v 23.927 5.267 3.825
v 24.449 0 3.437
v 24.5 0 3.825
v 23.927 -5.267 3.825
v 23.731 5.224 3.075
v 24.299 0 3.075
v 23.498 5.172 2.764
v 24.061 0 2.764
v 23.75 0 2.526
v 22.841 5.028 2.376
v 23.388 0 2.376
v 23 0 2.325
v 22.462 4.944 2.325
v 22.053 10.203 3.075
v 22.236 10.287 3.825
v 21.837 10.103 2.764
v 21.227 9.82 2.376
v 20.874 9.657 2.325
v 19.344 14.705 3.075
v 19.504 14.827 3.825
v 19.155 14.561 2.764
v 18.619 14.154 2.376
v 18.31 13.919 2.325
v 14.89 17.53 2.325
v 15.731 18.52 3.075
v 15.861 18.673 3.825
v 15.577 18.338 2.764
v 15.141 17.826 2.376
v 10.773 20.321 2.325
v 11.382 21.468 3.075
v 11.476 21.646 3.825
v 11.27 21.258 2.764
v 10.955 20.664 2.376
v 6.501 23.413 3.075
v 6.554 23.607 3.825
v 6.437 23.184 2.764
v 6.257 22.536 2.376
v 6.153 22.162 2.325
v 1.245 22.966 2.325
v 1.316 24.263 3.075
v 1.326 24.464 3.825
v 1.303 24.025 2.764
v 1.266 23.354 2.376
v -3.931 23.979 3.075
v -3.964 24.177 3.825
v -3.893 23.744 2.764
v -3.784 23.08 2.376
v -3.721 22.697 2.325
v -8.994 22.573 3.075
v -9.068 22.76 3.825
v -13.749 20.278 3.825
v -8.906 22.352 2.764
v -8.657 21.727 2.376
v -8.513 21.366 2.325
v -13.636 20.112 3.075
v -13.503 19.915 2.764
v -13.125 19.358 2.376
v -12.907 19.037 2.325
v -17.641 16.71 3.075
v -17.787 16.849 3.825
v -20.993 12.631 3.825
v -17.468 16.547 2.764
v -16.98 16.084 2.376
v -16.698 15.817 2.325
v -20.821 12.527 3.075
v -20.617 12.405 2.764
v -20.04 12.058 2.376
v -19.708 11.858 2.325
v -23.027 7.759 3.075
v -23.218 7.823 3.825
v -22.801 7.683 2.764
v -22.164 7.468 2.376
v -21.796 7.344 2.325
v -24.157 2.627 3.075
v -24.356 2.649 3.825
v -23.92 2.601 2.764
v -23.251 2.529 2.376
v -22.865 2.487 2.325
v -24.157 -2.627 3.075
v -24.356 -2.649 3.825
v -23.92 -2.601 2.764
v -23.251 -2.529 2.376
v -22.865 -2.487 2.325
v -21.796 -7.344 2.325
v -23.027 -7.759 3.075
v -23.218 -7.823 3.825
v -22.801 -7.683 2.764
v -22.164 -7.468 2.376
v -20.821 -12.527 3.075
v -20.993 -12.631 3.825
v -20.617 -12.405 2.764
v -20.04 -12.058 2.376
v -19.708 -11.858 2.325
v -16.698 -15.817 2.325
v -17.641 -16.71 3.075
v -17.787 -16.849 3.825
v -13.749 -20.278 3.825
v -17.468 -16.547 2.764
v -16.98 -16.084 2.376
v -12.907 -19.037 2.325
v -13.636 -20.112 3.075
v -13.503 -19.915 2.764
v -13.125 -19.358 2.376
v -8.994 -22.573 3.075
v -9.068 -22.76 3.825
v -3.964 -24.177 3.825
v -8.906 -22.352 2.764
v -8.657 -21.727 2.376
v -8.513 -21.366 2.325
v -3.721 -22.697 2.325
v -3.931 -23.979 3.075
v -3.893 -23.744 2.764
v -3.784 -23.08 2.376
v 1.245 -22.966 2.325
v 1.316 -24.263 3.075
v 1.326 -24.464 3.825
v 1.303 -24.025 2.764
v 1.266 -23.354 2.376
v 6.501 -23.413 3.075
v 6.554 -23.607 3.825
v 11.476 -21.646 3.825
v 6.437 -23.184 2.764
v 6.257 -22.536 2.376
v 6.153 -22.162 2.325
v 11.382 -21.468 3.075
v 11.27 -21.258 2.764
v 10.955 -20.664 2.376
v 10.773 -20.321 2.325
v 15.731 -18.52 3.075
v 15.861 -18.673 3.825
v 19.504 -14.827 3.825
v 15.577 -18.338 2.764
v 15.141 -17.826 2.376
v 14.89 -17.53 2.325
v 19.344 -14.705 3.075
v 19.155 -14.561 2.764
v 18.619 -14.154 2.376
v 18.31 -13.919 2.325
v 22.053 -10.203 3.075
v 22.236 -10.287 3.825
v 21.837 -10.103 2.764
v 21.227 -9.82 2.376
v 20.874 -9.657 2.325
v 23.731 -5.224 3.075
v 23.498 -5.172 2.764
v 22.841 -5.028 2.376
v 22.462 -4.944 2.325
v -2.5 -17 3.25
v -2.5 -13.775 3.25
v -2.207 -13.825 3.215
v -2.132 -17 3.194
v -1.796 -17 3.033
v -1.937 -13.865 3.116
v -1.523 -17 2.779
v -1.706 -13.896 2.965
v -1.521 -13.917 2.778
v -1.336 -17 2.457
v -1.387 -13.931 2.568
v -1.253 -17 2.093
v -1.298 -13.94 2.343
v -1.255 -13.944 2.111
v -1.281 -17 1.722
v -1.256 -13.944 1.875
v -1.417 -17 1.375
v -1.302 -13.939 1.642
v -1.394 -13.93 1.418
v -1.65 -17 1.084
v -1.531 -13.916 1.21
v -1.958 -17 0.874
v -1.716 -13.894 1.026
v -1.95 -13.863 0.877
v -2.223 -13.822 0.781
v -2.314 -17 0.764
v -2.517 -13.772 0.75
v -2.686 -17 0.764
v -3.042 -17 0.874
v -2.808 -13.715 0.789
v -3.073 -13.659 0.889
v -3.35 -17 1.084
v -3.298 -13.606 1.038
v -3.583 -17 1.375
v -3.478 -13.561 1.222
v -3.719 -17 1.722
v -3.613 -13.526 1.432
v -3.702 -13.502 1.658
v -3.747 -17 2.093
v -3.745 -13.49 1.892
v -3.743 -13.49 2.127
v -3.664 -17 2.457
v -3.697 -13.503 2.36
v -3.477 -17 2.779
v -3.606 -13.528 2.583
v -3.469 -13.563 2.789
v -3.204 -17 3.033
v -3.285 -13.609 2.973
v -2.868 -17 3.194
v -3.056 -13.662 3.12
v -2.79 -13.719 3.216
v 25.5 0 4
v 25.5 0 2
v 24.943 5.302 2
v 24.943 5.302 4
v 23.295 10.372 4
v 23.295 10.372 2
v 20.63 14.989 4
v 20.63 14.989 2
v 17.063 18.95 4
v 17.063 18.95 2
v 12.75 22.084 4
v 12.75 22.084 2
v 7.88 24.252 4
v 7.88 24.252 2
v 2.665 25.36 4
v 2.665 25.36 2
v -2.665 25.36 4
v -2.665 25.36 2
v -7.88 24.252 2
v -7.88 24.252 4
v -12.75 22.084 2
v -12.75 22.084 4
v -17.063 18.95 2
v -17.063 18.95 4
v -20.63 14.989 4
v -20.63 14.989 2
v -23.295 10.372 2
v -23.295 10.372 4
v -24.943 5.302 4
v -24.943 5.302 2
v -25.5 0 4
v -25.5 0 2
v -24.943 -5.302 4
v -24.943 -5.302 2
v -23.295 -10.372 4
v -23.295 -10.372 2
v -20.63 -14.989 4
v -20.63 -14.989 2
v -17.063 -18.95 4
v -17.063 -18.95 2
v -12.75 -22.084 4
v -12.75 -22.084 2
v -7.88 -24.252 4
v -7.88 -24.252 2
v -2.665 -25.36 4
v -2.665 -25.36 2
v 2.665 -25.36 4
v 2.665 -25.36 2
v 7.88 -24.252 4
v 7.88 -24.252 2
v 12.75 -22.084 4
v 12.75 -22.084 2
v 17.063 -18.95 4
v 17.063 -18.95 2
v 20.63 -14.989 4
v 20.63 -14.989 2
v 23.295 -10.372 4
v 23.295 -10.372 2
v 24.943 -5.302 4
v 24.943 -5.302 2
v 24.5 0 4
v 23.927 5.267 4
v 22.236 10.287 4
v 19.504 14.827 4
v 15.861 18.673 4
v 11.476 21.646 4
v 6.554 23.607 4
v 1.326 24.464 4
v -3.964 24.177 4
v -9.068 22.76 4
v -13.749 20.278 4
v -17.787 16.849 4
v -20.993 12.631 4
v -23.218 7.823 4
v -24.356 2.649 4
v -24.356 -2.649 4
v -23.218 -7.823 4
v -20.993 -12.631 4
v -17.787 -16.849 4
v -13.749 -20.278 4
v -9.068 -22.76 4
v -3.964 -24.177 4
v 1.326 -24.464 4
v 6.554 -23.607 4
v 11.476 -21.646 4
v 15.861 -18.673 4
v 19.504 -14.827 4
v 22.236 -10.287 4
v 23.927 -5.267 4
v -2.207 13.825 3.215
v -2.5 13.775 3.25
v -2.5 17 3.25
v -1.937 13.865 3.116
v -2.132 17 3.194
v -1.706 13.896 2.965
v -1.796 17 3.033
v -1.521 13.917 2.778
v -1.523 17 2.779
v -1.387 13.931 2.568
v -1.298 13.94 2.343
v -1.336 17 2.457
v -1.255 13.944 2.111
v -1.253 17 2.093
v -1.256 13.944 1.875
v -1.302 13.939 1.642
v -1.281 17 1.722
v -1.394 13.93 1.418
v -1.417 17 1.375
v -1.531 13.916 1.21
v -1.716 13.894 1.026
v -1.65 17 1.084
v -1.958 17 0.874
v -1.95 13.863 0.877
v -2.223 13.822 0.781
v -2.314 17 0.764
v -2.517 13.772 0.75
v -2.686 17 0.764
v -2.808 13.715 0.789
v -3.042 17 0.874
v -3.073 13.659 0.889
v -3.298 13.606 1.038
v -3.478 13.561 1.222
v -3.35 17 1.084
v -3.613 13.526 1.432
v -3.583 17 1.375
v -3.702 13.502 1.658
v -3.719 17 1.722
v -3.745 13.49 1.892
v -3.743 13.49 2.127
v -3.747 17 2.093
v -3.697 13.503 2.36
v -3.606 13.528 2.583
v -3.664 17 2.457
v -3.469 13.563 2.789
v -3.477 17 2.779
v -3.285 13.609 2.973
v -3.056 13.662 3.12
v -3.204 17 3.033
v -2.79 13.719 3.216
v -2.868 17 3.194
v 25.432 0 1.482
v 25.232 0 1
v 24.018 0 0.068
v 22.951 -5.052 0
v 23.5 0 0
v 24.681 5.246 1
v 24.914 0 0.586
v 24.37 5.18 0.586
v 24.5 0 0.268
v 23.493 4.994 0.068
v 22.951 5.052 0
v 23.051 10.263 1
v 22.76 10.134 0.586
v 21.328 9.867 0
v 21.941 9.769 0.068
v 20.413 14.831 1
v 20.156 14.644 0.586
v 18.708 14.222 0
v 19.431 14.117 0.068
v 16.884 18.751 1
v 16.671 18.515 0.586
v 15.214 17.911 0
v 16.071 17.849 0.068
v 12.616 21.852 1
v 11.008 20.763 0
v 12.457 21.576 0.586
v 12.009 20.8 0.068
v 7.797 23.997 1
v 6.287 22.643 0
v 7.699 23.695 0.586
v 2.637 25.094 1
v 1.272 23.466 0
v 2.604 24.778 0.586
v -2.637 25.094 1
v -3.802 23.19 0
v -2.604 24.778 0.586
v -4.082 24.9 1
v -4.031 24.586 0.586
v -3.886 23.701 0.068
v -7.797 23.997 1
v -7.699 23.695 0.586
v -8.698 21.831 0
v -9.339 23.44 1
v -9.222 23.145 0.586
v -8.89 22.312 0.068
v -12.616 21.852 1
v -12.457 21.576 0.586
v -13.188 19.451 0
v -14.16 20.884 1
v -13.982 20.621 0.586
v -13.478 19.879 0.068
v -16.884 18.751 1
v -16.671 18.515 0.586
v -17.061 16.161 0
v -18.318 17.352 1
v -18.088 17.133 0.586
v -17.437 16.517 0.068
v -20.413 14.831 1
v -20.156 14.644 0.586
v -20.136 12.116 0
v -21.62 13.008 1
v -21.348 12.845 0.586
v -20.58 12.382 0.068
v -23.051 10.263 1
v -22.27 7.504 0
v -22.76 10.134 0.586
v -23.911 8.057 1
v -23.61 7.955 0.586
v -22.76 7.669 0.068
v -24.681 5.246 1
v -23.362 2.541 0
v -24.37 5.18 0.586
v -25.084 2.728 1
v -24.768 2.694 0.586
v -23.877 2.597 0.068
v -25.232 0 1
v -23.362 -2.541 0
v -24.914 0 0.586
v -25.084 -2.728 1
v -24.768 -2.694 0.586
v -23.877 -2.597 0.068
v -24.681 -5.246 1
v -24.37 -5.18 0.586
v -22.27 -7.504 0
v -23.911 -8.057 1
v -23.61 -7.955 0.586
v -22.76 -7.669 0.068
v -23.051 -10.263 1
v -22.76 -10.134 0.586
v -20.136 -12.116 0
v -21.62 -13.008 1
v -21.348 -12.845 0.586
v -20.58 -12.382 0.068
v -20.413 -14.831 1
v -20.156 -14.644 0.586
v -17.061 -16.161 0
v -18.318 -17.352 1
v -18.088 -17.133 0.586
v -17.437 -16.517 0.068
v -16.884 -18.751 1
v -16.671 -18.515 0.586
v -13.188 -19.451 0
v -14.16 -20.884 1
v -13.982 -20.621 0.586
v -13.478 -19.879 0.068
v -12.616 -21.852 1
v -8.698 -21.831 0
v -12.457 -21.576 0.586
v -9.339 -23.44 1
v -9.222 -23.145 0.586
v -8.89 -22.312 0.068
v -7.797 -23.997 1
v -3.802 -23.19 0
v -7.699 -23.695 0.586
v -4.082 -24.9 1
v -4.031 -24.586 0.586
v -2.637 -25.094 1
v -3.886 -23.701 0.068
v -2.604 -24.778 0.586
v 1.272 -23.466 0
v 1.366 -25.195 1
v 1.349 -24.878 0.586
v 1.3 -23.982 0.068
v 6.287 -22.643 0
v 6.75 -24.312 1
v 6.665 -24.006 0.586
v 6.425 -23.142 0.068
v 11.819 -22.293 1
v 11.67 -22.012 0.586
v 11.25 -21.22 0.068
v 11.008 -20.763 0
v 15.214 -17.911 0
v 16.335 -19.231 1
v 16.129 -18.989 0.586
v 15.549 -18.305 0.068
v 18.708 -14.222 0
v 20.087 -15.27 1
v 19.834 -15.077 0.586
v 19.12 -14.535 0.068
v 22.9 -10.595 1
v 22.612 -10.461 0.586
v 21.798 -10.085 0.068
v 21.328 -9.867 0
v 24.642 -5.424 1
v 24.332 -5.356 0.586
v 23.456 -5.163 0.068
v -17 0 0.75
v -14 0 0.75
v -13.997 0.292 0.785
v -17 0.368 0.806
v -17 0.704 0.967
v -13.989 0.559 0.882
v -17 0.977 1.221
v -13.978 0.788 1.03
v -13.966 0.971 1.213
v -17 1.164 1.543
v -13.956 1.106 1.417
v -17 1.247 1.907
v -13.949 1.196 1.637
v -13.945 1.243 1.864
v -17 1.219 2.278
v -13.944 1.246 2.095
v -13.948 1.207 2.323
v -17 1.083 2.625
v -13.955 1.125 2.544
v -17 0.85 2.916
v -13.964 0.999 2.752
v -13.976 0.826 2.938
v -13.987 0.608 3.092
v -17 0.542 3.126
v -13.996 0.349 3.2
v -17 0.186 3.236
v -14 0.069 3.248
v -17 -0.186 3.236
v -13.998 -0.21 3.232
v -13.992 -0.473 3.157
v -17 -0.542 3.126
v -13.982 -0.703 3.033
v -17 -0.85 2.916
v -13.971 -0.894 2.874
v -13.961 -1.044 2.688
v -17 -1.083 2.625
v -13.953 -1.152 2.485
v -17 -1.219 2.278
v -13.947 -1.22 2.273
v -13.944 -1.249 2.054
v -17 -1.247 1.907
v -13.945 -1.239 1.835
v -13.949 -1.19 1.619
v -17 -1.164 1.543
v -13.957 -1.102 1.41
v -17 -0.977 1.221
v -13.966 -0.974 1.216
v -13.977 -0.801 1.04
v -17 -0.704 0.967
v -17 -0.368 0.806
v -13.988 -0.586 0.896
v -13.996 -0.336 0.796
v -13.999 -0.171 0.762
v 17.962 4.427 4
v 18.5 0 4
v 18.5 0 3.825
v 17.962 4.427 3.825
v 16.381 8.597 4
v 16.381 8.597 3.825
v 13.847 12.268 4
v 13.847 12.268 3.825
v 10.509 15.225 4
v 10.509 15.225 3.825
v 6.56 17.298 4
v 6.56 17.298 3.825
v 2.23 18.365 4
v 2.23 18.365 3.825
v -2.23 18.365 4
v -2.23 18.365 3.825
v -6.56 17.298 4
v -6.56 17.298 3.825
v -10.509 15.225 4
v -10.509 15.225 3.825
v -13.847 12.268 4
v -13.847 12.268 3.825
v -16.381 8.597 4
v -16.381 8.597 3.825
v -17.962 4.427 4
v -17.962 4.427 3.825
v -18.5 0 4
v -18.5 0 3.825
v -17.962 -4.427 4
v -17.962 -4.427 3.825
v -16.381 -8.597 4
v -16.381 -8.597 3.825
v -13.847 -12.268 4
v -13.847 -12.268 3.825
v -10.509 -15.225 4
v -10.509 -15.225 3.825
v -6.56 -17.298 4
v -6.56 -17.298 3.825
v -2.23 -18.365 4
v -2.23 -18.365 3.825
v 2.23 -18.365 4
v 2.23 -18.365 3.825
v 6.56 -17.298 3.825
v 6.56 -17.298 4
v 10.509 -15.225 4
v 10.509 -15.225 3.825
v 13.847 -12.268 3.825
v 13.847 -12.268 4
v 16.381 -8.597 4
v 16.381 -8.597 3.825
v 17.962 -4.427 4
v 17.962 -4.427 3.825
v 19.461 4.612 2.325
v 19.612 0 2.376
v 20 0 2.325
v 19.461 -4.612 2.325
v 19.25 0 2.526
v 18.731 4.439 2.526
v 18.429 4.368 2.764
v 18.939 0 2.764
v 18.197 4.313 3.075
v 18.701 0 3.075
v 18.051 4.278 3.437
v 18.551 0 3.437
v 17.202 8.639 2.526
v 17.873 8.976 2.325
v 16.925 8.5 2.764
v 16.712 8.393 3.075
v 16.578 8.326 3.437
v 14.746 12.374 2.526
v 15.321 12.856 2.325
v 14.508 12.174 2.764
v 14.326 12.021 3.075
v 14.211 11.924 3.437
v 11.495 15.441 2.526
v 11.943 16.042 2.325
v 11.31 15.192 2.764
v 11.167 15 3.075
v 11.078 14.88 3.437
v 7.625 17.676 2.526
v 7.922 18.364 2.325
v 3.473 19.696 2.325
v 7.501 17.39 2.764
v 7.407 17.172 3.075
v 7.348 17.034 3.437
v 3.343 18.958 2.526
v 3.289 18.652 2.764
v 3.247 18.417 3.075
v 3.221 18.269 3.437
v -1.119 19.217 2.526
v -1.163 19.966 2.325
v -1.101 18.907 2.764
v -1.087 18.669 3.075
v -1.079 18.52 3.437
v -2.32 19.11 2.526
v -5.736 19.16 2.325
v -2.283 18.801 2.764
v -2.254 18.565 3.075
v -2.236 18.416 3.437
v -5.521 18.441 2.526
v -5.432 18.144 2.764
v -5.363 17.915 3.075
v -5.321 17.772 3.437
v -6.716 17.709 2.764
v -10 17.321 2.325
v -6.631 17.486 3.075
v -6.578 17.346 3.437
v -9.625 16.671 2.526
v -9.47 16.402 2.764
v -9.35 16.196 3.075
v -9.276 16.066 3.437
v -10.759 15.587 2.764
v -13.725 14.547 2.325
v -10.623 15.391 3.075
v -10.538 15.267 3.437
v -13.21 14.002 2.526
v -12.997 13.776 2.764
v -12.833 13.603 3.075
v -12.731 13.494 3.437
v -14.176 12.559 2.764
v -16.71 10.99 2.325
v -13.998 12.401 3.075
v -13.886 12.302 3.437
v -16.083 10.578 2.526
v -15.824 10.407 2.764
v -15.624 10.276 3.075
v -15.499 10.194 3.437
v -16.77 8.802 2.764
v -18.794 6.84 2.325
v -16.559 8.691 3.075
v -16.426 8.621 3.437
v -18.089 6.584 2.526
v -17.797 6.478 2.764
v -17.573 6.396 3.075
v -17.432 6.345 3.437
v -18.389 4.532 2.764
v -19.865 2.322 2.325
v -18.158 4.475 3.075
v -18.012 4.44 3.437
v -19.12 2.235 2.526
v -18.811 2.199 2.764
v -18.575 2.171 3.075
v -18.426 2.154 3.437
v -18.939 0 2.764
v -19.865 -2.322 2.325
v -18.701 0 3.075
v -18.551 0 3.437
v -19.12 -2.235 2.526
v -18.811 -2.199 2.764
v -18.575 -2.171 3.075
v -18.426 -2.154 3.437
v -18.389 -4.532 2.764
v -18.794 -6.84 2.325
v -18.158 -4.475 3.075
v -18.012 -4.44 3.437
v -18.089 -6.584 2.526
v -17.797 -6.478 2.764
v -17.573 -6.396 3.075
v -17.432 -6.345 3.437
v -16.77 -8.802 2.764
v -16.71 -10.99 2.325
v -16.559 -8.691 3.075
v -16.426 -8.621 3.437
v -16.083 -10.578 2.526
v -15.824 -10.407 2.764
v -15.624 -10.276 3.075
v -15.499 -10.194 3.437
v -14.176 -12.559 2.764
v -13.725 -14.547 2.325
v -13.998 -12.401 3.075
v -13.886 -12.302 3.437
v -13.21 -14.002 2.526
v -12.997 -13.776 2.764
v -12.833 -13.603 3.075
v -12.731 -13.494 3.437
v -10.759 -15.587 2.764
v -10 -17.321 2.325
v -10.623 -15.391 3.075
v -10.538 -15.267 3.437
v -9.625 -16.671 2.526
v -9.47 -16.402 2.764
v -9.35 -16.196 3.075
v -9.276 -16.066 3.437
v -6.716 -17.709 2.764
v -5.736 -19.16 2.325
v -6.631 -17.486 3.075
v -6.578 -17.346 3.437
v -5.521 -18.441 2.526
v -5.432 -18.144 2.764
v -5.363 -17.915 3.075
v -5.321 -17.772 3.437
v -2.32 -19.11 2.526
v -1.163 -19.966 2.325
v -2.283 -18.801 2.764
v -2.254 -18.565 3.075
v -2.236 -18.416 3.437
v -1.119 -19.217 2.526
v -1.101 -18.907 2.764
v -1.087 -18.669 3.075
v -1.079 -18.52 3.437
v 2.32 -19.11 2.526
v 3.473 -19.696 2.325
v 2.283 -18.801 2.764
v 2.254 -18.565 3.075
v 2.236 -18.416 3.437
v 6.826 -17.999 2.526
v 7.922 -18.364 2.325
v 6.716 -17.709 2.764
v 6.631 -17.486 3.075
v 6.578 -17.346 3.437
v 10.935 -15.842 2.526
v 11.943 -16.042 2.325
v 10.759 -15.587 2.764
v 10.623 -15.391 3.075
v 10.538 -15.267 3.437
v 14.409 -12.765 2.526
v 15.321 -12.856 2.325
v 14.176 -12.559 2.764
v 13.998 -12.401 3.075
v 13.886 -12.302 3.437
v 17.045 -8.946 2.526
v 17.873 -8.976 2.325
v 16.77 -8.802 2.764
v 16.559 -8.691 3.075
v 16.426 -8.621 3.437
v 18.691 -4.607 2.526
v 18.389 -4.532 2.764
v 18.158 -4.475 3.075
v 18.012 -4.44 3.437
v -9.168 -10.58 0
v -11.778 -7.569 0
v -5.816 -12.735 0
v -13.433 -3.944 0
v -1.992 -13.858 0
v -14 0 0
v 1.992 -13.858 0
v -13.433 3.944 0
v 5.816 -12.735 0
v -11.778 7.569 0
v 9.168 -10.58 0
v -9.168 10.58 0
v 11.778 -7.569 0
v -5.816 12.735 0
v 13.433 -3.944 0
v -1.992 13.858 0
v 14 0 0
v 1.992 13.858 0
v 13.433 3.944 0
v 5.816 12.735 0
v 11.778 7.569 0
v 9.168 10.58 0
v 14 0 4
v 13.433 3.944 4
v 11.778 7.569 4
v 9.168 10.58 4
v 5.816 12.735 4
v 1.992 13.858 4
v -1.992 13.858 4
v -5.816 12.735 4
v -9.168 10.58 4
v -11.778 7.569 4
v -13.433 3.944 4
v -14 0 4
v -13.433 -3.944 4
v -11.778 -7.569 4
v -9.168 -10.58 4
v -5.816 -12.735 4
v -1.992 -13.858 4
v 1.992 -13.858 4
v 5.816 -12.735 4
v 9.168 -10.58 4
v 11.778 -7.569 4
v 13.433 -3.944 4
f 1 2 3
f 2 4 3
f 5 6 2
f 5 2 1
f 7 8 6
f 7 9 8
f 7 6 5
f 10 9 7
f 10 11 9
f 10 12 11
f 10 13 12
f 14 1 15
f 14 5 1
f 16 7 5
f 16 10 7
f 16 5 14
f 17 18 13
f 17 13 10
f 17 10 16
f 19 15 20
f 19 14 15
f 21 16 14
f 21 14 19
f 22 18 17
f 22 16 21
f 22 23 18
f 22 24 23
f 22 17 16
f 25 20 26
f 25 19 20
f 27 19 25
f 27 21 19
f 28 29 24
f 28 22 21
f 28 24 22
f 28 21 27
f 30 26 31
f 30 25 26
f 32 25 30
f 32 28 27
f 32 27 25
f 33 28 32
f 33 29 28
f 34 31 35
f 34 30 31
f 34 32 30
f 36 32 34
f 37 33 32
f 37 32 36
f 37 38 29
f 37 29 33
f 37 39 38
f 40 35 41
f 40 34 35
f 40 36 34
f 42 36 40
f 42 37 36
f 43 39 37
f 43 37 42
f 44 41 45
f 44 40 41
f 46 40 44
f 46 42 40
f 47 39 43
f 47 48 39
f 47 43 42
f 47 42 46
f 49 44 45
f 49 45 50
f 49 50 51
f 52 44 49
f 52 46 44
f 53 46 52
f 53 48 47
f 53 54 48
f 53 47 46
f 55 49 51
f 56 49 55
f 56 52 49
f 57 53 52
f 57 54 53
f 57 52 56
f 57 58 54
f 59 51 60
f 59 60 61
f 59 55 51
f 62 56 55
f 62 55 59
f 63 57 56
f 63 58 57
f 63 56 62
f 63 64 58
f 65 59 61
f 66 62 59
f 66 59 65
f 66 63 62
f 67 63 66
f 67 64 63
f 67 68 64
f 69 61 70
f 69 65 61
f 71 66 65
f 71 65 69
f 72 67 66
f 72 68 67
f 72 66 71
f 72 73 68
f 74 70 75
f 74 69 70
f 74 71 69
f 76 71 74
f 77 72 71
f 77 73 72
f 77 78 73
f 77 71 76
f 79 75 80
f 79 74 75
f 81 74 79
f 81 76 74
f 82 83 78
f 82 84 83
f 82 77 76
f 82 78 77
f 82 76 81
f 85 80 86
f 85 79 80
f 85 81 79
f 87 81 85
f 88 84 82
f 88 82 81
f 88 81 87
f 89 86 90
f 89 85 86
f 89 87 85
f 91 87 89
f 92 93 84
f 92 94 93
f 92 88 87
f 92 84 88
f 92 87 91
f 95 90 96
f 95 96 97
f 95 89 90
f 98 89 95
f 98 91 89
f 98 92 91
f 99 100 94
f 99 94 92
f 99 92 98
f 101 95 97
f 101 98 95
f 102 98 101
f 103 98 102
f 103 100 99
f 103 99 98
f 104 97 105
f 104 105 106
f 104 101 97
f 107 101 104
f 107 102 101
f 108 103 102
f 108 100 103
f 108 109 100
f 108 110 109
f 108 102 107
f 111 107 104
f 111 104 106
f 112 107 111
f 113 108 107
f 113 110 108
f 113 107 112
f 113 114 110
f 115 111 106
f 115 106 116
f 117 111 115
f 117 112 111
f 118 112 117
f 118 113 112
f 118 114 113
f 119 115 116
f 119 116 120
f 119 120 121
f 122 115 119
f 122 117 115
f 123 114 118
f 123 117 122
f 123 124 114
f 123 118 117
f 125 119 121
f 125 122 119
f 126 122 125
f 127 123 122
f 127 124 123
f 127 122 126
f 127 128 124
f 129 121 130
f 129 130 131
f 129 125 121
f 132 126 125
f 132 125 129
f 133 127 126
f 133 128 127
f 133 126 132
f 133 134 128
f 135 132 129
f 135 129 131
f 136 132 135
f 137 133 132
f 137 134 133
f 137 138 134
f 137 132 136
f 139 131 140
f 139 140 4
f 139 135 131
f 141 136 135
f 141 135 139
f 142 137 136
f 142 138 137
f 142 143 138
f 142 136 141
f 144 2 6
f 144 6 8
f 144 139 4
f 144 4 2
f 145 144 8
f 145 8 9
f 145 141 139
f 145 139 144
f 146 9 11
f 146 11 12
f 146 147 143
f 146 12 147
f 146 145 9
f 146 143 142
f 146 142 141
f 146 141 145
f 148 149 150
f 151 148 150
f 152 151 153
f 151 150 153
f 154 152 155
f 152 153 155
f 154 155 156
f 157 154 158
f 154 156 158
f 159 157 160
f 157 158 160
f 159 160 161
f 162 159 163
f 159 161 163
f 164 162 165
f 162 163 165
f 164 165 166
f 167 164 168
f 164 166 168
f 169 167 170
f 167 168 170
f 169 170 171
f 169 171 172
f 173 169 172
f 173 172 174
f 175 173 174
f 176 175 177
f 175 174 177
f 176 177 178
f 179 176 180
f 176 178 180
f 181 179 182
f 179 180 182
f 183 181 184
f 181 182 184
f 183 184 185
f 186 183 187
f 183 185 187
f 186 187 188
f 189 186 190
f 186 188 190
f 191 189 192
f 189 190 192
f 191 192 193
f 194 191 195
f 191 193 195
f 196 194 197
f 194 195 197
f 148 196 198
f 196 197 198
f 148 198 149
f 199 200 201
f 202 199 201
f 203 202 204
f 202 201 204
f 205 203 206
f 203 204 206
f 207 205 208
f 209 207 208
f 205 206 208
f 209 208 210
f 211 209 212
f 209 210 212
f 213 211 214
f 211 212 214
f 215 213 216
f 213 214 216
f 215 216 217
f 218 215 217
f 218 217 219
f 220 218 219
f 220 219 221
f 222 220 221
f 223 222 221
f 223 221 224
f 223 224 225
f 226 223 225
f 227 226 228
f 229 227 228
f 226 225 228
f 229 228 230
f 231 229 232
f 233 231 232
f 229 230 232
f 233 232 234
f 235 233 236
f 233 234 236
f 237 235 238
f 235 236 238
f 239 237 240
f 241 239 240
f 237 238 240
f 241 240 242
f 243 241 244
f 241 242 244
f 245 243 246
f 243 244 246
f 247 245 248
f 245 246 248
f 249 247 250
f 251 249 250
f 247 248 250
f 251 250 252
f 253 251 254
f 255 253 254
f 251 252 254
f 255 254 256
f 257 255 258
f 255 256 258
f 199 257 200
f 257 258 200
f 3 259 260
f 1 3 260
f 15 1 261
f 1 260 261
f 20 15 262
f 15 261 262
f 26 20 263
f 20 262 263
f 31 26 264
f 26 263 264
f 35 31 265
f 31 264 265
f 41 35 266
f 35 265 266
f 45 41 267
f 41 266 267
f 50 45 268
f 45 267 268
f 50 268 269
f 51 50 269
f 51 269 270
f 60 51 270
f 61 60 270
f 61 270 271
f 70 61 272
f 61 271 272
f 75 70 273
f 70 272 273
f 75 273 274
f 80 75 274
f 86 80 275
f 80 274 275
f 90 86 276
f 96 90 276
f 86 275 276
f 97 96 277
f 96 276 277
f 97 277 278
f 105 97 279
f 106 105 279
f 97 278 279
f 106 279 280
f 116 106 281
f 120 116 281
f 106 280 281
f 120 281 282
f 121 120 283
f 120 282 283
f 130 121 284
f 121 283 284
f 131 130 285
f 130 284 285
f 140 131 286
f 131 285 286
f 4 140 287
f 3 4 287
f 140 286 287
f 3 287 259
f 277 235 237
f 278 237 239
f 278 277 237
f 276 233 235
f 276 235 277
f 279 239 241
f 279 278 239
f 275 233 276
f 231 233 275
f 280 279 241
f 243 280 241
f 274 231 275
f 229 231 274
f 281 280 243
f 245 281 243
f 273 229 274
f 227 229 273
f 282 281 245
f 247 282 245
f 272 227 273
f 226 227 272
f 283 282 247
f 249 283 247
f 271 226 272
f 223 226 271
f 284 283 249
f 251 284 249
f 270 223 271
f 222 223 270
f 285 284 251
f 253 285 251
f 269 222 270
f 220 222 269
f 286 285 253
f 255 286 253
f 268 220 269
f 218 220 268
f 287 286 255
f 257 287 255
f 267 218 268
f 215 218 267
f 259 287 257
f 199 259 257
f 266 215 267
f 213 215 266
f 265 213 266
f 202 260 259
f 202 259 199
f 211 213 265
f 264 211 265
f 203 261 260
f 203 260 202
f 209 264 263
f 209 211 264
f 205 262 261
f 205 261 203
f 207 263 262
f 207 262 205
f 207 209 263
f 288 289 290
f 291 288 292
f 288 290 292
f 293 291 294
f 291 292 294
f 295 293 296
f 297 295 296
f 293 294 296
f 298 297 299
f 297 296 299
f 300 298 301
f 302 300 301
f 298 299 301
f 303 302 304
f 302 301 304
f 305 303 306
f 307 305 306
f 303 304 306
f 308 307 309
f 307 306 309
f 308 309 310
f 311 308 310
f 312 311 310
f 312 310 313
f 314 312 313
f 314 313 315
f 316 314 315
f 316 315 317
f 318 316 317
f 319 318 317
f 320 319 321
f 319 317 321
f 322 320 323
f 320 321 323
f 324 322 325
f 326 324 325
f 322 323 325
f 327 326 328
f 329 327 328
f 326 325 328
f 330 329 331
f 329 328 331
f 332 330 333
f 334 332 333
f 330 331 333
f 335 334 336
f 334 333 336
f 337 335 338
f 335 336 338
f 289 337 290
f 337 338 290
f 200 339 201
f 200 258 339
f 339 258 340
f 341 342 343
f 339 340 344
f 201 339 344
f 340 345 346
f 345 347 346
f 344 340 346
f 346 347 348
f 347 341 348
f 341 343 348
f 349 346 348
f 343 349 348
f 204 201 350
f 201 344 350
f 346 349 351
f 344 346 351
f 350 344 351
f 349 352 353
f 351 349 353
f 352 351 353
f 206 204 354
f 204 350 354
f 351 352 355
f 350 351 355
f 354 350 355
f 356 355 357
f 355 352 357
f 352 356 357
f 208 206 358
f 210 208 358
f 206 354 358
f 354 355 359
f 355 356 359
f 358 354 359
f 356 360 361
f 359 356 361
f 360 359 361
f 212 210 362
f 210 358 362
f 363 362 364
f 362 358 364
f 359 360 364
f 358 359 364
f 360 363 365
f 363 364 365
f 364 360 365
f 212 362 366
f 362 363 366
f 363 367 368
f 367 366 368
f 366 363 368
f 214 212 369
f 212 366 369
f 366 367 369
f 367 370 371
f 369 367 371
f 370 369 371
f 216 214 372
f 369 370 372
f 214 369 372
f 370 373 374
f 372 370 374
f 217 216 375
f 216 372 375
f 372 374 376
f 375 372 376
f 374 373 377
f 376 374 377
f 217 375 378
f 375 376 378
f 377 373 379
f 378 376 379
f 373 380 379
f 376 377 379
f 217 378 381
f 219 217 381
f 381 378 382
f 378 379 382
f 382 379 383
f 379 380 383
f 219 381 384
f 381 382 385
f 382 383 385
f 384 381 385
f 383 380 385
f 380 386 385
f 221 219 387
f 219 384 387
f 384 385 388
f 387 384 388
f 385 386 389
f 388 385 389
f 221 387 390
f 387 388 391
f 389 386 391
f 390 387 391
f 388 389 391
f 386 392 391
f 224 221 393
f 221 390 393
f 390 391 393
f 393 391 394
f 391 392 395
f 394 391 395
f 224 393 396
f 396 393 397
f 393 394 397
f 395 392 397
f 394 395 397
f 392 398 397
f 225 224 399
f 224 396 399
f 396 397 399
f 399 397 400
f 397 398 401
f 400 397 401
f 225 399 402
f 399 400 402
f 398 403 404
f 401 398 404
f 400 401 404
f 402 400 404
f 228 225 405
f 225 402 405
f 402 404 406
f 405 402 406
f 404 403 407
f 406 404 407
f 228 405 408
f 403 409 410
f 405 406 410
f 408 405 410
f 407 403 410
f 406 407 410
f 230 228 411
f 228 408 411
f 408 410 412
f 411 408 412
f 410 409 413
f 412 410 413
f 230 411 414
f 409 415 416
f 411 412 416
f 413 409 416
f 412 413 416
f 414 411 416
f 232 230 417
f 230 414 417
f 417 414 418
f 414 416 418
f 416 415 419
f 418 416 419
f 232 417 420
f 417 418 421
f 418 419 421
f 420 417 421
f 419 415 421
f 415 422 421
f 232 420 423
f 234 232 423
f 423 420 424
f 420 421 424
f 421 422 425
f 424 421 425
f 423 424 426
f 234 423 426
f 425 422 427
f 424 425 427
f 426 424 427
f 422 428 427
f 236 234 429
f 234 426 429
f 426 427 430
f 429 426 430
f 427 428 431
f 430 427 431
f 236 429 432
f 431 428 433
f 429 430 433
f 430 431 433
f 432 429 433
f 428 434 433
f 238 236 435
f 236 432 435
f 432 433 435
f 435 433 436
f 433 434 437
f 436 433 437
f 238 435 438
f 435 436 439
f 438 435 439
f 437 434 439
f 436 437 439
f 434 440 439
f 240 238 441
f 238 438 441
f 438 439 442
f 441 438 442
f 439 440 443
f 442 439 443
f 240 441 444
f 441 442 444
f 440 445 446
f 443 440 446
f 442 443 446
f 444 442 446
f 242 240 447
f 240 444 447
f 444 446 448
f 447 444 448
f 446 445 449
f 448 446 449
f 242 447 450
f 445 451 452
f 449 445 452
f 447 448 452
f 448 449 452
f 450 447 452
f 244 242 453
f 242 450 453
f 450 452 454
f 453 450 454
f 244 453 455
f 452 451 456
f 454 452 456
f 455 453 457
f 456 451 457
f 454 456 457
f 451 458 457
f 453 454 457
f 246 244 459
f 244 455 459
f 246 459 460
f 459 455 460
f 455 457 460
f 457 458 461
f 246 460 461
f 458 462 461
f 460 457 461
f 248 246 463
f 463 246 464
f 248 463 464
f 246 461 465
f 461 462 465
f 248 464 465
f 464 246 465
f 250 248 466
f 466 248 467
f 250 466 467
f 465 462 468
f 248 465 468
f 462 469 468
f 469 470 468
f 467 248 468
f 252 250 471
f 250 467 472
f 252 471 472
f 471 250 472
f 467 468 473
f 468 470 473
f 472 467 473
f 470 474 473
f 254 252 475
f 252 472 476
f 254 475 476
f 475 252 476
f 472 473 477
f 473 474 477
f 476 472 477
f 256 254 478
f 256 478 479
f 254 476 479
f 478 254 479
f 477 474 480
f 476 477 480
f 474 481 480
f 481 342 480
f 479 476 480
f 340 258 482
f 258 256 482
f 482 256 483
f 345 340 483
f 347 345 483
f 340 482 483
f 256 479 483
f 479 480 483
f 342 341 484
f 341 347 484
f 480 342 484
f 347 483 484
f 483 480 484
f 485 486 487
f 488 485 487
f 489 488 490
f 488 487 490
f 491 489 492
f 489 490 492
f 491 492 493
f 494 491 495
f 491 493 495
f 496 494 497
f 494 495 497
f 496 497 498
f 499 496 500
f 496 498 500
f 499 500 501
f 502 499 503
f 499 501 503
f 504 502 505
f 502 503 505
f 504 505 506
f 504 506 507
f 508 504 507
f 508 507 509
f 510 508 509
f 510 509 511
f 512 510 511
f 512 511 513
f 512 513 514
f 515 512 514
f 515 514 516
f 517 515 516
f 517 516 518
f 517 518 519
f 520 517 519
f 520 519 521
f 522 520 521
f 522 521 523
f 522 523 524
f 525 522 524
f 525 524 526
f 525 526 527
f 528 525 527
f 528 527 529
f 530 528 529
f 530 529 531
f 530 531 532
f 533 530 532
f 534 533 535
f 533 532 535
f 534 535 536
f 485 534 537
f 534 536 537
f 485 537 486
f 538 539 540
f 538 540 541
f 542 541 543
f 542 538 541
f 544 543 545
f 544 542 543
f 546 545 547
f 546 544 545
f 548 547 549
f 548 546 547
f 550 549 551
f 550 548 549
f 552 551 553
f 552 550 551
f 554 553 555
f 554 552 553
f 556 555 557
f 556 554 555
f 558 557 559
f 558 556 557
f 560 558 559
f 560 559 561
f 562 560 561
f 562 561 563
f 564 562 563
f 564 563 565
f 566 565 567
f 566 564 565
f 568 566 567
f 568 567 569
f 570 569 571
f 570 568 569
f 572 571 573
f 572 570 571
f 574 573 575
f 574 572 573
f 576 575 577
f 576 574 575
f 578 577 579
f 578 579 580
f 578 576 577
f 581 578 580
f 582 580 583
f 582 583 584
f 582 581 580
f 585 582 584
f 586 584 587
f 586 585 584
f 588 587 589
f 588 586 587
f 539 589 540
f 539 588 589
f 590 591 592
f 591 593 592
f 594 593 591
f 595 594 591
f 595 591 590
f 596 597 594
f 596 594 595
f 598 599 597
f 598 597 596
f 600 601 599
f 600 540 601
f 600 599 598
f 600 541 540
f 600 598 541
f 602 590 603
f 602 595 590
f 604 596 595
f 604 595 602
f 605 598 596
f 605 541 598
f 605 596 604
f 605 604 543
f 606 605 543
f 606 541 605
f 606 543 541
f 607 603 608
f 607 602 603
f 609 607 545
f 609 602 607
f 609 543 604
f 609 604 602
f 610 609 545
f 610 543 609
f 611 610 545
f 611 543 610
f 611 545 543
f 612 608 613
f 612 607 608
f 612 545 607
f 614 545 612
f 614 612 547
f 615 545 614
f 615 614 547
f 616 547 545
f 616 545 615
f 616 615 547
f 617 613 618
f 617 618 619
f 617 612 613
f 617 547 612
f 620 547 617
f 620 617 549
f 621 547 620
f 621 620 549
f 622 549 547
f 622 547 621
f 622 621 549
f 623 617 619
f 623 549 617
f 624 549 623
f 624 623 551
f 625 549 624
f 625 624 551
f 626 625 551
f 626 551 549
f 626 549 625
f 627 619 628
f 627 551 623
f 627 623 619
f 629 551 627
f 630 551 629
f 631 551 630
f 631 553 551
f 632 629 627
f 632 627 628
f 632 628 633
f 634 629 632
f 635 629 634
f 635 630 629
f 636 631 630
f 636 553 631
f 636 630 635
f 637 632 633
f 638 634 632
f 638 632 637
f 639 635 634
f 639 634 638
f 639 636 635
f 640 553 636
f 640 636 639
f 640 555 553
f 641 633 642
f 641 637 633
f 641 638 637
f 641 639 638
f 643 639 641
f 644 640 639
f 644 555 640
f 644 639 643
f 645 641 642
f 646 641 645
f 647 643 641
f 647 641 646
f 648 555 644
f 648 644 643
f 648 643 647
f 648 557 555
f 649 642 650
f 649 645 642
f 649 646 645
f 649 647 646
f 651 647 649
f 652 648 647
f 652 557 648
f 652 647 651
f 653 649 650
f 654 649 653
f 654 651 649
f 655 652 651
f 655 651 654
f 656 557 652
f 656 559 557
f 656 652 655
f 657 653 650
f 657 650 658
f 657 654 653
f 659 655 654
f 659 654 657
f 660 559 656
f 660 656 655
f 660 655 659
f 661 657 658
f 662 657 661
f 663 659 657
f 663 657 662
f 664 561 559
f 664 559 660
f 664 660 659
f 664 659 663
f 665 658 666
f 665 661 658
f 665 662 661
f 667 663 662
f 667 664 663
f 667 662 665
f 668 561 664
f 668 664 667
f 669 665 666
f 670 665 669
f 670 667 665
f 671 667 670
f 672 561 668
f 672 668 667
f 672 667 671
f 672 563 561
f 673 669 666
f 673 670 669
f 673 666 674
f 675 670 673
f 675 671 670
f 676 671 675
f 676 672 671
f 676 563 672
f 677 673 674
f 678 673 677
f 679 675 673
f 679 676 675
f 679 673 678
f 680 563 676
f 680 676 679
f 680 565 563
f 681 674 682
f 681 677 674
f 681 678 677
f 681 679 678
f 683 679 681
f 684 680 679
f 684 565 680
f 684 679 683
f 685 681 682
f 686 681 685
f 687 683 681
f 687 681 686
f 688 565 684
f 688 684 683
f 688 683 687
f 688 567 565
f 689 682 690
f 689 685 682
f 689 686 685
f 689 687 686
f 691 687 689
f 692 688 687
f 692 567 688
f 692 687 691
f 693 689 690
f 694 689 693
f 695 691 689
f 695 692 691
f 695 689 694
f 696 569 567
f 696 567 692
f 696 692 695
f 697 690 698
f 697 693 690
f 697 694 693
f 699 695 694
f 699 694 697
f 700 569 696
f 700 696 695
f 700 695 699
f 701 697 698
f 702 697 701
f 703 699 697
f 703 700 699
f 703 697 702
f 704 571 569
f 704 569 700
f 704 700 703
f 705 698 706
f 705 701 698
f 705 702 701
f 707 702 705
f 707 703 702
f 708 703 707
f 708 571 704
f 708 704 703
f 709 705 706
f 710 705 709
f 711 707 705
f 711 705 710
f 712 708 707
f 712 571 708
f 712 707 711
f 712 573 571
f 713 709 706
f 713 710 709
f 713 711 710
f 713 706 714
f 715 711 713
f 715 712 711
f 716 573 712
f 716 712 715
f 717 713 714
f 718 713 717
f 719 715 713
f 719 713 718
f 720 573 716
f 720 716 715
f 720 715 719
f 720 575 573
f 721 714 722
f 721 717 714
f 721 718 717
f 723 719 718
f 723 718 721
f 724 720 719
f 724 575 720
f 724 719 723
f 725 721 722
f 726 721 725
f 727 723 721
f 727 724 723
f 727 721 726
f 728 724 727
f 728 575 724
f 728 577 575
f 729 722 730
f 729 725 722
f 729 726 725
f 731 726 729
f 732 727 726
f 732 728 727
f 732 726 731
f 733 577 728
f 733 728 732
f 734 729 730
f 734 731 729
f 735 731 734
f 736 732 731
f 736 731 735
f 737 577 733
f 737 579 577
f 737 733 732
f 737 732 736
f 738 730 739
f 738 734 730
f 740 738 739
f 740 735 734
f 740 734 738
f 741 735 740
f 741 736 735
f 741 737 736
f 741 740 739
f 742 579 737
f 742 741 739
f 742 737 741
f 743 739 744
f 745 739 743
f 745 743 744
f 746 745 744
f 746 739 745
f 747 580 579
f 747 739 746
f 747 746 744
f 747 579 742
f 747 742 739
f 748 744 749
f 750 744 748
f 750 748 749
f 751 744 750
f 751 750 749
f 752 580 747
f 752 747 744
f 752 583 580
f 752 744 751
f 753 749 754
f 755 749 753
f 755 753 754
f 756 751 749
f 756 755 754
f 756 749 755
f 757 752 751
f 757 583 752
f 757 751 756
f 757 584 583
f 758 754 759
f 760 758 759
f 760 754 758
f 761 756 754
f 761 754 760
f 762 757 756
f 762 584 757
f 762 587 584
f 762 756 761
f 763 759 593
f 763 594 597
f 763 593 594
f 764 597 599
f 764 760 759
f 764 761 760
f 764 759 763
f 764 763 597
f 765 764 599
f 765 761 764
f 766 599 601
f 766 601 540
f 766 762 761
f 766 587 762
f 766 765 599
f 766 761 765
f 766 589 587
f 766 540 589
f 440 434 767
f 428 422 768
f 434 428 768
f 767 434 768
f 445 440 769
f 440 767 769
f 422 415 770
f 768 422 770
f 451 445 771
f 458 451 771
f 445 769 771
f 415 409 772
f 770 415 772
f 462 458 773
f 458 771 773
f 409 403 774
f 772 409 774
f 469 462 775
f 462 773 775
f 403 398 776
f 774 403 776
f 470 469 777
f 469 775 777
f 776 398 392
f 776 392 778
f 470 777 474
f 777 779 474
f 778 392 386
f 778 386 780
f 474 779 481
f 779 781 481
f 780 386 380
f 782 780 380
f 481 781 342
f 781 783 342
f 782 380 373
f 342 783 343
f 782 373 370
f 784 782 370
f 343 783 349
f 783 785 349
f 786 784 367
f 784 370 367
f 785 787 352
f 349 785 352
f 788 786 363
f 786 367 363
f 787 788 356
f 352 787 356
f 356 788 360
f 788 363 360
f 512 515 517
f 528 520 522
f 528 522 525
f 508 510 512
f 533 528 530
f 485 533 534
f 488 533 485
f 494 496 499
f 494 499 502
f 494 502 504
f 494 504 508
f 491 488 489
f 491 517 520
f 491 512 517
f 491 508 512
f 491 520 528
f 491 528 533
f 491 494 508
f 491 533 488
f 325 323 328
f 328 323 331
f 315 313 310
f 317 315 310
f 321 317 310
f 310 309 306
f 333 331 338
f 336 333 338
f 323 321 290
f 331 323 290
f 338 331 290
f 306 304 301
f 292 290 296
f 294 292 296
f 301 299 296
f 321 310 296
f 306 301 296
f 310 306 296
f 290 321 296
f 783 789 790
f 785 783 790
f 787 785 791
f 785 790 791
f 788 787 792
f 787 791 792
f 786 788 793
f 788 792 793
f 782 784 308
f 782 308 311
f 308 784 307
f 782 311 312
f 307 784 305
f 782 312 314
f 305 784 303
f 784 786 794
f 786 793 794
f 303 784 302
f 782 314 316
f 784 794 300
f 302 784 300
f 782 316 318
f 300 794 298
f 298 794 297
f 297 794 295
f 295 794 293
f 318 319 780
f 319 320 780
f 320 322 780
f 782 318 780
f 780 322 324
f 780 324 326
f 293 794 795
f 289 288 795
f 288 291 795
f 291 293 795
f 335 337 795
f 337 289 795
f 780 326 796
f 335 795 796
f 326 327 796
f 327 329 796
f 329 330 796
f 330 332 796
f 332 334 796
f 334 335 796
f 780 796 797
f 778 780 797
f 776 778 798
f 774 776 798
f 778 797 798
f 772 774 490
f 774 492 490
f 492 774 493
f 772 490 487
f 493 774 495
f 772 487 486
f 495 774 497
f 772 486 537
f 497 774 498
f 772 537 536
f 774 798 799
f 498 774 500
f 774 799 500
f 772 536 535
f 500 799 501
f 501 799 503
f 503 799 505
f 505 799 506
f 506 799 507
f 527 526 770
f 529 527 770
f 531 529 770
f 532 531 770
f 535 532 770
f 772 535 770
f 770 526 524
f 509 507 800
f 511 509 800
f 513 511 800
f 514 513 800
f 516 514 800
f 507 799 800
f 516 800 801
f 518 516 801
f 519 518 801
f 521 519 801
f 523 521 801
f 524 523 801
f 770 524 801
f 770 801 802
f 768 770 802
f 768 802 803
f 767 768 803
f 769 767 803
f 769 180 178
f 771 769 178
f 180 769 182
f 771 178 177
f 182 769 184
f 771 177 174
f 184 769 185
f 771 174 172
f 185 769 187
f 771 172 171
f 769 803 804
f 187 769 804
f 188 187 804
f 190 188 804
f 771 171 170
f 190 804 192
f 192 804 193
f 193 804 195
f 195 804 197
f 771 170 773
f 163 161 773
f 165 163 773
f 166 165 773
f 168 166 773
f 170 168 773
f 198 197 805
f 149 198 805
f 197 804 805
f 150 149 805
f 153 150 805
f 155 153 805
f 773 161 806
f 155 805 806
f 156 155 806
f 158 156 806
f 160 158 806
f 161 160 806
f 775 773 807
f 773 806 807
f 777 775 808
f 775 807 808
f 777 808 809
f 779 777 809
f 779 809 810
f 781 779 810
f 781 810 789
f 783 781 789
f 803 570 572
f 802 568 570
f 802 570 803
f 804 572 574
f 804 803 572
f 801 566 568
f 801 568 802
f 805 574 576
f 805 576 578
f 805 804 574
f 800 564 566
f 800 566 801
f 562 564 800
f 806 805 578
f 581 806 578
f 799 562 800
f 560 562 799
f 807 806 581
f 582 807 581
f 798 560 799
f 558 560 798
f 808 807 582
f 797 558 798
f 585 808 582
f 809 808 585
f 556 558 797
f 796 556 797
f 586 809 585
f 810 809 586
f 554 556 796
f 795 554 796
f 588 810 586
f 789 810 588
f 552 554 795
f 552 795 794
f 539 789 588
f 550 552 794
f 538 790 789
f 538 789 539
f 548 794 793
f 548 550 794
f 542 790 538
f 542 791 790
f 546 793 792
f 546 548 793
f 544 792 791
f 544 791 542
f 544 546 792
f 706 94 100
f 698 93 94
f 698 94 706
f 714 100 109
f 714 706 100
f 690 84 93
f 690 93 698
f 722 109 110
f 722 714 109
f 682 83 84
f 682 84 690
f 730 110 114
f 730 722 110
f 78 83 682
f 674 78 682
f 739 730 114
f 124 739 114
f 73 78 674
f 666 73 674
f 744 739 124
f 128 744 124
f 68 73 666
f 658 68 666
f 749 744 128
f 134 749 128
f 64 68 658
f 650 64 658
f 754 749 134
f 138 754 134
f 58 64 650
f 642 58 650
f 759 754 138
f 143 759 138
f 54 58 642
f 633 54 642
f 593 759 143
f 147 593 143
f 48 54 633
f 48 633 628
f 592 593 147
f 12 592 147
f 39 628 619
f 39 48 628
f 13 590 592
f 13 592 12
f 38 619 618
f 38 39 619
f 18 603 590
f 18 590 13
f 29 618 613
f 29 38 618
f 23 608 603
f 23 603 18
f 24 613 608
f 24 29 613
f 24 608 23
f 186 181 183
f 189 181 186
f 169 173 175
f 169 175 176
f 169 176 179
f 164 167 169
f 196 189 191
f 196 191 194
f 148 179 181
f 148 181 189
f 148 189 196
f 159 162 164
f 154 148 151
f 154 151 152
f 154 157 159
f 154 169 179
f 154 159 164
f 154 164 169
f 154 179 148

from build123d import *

# Parameters (mm, degrees)
SKETCH1_R           = 25.5
BOSS_EXTRUDE1_DEPTH = 4
SKETCH2_R           = 24.5
SKETCH2_R_2         = 18.5
CUT_EXTRUDE1_DEPTH  = 1.675
FILLET1_R           = 1.5
SKETCH3_R           = 14
CUT_EXTRUDE2_DEPTH  = 4
FILLET2_R           = 2
SKETCH4_R           = 1.25
CUT_EXTRUDE3_DEPTH  = 17
SKETCH5_R           = 1.25
CUT_EXTRUDE5_DEPTH  = 17


with BuildPart() as part:
    # Sketch1 → Boss-Extrude1 (new body)
    with BuildSketch(Plane.XY):
        Circle(SKETCH1_R)
    extrude(amount=BOSS_EXTRUDE1_DEPTH)

    # Sketch2 → Cut-Extrude1 (cut)
    with BuildSketch(Plane.XY.offset(4)):
        Circle(SKETCH2_R)
        Circle(SKETCH2_R_2, mode=Mode.SUBTRACT)
    extrude(amount=-CUT_EXTRUDE1_DEPTH, mode=Mode.SUBTRACT)

    # Fillet1
    fillet1_edges = [part.edges().sort_by_distance(p)[0] for p in [
        (-24.5, 0, 2.325),
        (-18.5, 0, 2.325),
    ]]
    fillet(fillet1_edges, radius=FILLET1_R)

    # Sketch3 → Cut-Extrude2 (cut)
    with BuildSketch(Plane.XY.offset(4)):
        Circle(SKETCH3_R)
    extrude(amount=-CUT_EXTRUDE2_DEPTH, mode=Mode.SUBTRACT)

    # Fillet2
    fillet2_edges = [part.edges().sort_by_distance(p)[0] for p in [
        (-25.5, 0, 0),
    ]]
    fillet(fillet2_edges, radius=FILLET2_R)

    # Sketch4 → Cut-Extrude3 (cut)
    with BuildSketch(Plane(origin=(0, 0, 0), x_dir=(0, 0, -1), z_dir=(1, 0, 0))):
        with Locations((-2, 0)):
            Circle(SKETCH4_R)
    extrude(amount=-CUT_EXTRUDE3_DEPTH, mode=Mode.SUBTRACT)

    # Sketch5 → Cut-Extrude5 (cut, symmetric)
    with BuildSketch(Plane(origin=(0, 0, 0), x_dir=(1, 0, 0), z_dir=(0, 1, 0))):
        with Locations(Location((-2.5, -2, 0), (0, 0, 270))):
            Circle(SKETCH5_R)
    extrude(amount=CUT_EXTRUDE5_DEPTH, both=True, mode=Mode.SUBTRACT)


solid = part.part
